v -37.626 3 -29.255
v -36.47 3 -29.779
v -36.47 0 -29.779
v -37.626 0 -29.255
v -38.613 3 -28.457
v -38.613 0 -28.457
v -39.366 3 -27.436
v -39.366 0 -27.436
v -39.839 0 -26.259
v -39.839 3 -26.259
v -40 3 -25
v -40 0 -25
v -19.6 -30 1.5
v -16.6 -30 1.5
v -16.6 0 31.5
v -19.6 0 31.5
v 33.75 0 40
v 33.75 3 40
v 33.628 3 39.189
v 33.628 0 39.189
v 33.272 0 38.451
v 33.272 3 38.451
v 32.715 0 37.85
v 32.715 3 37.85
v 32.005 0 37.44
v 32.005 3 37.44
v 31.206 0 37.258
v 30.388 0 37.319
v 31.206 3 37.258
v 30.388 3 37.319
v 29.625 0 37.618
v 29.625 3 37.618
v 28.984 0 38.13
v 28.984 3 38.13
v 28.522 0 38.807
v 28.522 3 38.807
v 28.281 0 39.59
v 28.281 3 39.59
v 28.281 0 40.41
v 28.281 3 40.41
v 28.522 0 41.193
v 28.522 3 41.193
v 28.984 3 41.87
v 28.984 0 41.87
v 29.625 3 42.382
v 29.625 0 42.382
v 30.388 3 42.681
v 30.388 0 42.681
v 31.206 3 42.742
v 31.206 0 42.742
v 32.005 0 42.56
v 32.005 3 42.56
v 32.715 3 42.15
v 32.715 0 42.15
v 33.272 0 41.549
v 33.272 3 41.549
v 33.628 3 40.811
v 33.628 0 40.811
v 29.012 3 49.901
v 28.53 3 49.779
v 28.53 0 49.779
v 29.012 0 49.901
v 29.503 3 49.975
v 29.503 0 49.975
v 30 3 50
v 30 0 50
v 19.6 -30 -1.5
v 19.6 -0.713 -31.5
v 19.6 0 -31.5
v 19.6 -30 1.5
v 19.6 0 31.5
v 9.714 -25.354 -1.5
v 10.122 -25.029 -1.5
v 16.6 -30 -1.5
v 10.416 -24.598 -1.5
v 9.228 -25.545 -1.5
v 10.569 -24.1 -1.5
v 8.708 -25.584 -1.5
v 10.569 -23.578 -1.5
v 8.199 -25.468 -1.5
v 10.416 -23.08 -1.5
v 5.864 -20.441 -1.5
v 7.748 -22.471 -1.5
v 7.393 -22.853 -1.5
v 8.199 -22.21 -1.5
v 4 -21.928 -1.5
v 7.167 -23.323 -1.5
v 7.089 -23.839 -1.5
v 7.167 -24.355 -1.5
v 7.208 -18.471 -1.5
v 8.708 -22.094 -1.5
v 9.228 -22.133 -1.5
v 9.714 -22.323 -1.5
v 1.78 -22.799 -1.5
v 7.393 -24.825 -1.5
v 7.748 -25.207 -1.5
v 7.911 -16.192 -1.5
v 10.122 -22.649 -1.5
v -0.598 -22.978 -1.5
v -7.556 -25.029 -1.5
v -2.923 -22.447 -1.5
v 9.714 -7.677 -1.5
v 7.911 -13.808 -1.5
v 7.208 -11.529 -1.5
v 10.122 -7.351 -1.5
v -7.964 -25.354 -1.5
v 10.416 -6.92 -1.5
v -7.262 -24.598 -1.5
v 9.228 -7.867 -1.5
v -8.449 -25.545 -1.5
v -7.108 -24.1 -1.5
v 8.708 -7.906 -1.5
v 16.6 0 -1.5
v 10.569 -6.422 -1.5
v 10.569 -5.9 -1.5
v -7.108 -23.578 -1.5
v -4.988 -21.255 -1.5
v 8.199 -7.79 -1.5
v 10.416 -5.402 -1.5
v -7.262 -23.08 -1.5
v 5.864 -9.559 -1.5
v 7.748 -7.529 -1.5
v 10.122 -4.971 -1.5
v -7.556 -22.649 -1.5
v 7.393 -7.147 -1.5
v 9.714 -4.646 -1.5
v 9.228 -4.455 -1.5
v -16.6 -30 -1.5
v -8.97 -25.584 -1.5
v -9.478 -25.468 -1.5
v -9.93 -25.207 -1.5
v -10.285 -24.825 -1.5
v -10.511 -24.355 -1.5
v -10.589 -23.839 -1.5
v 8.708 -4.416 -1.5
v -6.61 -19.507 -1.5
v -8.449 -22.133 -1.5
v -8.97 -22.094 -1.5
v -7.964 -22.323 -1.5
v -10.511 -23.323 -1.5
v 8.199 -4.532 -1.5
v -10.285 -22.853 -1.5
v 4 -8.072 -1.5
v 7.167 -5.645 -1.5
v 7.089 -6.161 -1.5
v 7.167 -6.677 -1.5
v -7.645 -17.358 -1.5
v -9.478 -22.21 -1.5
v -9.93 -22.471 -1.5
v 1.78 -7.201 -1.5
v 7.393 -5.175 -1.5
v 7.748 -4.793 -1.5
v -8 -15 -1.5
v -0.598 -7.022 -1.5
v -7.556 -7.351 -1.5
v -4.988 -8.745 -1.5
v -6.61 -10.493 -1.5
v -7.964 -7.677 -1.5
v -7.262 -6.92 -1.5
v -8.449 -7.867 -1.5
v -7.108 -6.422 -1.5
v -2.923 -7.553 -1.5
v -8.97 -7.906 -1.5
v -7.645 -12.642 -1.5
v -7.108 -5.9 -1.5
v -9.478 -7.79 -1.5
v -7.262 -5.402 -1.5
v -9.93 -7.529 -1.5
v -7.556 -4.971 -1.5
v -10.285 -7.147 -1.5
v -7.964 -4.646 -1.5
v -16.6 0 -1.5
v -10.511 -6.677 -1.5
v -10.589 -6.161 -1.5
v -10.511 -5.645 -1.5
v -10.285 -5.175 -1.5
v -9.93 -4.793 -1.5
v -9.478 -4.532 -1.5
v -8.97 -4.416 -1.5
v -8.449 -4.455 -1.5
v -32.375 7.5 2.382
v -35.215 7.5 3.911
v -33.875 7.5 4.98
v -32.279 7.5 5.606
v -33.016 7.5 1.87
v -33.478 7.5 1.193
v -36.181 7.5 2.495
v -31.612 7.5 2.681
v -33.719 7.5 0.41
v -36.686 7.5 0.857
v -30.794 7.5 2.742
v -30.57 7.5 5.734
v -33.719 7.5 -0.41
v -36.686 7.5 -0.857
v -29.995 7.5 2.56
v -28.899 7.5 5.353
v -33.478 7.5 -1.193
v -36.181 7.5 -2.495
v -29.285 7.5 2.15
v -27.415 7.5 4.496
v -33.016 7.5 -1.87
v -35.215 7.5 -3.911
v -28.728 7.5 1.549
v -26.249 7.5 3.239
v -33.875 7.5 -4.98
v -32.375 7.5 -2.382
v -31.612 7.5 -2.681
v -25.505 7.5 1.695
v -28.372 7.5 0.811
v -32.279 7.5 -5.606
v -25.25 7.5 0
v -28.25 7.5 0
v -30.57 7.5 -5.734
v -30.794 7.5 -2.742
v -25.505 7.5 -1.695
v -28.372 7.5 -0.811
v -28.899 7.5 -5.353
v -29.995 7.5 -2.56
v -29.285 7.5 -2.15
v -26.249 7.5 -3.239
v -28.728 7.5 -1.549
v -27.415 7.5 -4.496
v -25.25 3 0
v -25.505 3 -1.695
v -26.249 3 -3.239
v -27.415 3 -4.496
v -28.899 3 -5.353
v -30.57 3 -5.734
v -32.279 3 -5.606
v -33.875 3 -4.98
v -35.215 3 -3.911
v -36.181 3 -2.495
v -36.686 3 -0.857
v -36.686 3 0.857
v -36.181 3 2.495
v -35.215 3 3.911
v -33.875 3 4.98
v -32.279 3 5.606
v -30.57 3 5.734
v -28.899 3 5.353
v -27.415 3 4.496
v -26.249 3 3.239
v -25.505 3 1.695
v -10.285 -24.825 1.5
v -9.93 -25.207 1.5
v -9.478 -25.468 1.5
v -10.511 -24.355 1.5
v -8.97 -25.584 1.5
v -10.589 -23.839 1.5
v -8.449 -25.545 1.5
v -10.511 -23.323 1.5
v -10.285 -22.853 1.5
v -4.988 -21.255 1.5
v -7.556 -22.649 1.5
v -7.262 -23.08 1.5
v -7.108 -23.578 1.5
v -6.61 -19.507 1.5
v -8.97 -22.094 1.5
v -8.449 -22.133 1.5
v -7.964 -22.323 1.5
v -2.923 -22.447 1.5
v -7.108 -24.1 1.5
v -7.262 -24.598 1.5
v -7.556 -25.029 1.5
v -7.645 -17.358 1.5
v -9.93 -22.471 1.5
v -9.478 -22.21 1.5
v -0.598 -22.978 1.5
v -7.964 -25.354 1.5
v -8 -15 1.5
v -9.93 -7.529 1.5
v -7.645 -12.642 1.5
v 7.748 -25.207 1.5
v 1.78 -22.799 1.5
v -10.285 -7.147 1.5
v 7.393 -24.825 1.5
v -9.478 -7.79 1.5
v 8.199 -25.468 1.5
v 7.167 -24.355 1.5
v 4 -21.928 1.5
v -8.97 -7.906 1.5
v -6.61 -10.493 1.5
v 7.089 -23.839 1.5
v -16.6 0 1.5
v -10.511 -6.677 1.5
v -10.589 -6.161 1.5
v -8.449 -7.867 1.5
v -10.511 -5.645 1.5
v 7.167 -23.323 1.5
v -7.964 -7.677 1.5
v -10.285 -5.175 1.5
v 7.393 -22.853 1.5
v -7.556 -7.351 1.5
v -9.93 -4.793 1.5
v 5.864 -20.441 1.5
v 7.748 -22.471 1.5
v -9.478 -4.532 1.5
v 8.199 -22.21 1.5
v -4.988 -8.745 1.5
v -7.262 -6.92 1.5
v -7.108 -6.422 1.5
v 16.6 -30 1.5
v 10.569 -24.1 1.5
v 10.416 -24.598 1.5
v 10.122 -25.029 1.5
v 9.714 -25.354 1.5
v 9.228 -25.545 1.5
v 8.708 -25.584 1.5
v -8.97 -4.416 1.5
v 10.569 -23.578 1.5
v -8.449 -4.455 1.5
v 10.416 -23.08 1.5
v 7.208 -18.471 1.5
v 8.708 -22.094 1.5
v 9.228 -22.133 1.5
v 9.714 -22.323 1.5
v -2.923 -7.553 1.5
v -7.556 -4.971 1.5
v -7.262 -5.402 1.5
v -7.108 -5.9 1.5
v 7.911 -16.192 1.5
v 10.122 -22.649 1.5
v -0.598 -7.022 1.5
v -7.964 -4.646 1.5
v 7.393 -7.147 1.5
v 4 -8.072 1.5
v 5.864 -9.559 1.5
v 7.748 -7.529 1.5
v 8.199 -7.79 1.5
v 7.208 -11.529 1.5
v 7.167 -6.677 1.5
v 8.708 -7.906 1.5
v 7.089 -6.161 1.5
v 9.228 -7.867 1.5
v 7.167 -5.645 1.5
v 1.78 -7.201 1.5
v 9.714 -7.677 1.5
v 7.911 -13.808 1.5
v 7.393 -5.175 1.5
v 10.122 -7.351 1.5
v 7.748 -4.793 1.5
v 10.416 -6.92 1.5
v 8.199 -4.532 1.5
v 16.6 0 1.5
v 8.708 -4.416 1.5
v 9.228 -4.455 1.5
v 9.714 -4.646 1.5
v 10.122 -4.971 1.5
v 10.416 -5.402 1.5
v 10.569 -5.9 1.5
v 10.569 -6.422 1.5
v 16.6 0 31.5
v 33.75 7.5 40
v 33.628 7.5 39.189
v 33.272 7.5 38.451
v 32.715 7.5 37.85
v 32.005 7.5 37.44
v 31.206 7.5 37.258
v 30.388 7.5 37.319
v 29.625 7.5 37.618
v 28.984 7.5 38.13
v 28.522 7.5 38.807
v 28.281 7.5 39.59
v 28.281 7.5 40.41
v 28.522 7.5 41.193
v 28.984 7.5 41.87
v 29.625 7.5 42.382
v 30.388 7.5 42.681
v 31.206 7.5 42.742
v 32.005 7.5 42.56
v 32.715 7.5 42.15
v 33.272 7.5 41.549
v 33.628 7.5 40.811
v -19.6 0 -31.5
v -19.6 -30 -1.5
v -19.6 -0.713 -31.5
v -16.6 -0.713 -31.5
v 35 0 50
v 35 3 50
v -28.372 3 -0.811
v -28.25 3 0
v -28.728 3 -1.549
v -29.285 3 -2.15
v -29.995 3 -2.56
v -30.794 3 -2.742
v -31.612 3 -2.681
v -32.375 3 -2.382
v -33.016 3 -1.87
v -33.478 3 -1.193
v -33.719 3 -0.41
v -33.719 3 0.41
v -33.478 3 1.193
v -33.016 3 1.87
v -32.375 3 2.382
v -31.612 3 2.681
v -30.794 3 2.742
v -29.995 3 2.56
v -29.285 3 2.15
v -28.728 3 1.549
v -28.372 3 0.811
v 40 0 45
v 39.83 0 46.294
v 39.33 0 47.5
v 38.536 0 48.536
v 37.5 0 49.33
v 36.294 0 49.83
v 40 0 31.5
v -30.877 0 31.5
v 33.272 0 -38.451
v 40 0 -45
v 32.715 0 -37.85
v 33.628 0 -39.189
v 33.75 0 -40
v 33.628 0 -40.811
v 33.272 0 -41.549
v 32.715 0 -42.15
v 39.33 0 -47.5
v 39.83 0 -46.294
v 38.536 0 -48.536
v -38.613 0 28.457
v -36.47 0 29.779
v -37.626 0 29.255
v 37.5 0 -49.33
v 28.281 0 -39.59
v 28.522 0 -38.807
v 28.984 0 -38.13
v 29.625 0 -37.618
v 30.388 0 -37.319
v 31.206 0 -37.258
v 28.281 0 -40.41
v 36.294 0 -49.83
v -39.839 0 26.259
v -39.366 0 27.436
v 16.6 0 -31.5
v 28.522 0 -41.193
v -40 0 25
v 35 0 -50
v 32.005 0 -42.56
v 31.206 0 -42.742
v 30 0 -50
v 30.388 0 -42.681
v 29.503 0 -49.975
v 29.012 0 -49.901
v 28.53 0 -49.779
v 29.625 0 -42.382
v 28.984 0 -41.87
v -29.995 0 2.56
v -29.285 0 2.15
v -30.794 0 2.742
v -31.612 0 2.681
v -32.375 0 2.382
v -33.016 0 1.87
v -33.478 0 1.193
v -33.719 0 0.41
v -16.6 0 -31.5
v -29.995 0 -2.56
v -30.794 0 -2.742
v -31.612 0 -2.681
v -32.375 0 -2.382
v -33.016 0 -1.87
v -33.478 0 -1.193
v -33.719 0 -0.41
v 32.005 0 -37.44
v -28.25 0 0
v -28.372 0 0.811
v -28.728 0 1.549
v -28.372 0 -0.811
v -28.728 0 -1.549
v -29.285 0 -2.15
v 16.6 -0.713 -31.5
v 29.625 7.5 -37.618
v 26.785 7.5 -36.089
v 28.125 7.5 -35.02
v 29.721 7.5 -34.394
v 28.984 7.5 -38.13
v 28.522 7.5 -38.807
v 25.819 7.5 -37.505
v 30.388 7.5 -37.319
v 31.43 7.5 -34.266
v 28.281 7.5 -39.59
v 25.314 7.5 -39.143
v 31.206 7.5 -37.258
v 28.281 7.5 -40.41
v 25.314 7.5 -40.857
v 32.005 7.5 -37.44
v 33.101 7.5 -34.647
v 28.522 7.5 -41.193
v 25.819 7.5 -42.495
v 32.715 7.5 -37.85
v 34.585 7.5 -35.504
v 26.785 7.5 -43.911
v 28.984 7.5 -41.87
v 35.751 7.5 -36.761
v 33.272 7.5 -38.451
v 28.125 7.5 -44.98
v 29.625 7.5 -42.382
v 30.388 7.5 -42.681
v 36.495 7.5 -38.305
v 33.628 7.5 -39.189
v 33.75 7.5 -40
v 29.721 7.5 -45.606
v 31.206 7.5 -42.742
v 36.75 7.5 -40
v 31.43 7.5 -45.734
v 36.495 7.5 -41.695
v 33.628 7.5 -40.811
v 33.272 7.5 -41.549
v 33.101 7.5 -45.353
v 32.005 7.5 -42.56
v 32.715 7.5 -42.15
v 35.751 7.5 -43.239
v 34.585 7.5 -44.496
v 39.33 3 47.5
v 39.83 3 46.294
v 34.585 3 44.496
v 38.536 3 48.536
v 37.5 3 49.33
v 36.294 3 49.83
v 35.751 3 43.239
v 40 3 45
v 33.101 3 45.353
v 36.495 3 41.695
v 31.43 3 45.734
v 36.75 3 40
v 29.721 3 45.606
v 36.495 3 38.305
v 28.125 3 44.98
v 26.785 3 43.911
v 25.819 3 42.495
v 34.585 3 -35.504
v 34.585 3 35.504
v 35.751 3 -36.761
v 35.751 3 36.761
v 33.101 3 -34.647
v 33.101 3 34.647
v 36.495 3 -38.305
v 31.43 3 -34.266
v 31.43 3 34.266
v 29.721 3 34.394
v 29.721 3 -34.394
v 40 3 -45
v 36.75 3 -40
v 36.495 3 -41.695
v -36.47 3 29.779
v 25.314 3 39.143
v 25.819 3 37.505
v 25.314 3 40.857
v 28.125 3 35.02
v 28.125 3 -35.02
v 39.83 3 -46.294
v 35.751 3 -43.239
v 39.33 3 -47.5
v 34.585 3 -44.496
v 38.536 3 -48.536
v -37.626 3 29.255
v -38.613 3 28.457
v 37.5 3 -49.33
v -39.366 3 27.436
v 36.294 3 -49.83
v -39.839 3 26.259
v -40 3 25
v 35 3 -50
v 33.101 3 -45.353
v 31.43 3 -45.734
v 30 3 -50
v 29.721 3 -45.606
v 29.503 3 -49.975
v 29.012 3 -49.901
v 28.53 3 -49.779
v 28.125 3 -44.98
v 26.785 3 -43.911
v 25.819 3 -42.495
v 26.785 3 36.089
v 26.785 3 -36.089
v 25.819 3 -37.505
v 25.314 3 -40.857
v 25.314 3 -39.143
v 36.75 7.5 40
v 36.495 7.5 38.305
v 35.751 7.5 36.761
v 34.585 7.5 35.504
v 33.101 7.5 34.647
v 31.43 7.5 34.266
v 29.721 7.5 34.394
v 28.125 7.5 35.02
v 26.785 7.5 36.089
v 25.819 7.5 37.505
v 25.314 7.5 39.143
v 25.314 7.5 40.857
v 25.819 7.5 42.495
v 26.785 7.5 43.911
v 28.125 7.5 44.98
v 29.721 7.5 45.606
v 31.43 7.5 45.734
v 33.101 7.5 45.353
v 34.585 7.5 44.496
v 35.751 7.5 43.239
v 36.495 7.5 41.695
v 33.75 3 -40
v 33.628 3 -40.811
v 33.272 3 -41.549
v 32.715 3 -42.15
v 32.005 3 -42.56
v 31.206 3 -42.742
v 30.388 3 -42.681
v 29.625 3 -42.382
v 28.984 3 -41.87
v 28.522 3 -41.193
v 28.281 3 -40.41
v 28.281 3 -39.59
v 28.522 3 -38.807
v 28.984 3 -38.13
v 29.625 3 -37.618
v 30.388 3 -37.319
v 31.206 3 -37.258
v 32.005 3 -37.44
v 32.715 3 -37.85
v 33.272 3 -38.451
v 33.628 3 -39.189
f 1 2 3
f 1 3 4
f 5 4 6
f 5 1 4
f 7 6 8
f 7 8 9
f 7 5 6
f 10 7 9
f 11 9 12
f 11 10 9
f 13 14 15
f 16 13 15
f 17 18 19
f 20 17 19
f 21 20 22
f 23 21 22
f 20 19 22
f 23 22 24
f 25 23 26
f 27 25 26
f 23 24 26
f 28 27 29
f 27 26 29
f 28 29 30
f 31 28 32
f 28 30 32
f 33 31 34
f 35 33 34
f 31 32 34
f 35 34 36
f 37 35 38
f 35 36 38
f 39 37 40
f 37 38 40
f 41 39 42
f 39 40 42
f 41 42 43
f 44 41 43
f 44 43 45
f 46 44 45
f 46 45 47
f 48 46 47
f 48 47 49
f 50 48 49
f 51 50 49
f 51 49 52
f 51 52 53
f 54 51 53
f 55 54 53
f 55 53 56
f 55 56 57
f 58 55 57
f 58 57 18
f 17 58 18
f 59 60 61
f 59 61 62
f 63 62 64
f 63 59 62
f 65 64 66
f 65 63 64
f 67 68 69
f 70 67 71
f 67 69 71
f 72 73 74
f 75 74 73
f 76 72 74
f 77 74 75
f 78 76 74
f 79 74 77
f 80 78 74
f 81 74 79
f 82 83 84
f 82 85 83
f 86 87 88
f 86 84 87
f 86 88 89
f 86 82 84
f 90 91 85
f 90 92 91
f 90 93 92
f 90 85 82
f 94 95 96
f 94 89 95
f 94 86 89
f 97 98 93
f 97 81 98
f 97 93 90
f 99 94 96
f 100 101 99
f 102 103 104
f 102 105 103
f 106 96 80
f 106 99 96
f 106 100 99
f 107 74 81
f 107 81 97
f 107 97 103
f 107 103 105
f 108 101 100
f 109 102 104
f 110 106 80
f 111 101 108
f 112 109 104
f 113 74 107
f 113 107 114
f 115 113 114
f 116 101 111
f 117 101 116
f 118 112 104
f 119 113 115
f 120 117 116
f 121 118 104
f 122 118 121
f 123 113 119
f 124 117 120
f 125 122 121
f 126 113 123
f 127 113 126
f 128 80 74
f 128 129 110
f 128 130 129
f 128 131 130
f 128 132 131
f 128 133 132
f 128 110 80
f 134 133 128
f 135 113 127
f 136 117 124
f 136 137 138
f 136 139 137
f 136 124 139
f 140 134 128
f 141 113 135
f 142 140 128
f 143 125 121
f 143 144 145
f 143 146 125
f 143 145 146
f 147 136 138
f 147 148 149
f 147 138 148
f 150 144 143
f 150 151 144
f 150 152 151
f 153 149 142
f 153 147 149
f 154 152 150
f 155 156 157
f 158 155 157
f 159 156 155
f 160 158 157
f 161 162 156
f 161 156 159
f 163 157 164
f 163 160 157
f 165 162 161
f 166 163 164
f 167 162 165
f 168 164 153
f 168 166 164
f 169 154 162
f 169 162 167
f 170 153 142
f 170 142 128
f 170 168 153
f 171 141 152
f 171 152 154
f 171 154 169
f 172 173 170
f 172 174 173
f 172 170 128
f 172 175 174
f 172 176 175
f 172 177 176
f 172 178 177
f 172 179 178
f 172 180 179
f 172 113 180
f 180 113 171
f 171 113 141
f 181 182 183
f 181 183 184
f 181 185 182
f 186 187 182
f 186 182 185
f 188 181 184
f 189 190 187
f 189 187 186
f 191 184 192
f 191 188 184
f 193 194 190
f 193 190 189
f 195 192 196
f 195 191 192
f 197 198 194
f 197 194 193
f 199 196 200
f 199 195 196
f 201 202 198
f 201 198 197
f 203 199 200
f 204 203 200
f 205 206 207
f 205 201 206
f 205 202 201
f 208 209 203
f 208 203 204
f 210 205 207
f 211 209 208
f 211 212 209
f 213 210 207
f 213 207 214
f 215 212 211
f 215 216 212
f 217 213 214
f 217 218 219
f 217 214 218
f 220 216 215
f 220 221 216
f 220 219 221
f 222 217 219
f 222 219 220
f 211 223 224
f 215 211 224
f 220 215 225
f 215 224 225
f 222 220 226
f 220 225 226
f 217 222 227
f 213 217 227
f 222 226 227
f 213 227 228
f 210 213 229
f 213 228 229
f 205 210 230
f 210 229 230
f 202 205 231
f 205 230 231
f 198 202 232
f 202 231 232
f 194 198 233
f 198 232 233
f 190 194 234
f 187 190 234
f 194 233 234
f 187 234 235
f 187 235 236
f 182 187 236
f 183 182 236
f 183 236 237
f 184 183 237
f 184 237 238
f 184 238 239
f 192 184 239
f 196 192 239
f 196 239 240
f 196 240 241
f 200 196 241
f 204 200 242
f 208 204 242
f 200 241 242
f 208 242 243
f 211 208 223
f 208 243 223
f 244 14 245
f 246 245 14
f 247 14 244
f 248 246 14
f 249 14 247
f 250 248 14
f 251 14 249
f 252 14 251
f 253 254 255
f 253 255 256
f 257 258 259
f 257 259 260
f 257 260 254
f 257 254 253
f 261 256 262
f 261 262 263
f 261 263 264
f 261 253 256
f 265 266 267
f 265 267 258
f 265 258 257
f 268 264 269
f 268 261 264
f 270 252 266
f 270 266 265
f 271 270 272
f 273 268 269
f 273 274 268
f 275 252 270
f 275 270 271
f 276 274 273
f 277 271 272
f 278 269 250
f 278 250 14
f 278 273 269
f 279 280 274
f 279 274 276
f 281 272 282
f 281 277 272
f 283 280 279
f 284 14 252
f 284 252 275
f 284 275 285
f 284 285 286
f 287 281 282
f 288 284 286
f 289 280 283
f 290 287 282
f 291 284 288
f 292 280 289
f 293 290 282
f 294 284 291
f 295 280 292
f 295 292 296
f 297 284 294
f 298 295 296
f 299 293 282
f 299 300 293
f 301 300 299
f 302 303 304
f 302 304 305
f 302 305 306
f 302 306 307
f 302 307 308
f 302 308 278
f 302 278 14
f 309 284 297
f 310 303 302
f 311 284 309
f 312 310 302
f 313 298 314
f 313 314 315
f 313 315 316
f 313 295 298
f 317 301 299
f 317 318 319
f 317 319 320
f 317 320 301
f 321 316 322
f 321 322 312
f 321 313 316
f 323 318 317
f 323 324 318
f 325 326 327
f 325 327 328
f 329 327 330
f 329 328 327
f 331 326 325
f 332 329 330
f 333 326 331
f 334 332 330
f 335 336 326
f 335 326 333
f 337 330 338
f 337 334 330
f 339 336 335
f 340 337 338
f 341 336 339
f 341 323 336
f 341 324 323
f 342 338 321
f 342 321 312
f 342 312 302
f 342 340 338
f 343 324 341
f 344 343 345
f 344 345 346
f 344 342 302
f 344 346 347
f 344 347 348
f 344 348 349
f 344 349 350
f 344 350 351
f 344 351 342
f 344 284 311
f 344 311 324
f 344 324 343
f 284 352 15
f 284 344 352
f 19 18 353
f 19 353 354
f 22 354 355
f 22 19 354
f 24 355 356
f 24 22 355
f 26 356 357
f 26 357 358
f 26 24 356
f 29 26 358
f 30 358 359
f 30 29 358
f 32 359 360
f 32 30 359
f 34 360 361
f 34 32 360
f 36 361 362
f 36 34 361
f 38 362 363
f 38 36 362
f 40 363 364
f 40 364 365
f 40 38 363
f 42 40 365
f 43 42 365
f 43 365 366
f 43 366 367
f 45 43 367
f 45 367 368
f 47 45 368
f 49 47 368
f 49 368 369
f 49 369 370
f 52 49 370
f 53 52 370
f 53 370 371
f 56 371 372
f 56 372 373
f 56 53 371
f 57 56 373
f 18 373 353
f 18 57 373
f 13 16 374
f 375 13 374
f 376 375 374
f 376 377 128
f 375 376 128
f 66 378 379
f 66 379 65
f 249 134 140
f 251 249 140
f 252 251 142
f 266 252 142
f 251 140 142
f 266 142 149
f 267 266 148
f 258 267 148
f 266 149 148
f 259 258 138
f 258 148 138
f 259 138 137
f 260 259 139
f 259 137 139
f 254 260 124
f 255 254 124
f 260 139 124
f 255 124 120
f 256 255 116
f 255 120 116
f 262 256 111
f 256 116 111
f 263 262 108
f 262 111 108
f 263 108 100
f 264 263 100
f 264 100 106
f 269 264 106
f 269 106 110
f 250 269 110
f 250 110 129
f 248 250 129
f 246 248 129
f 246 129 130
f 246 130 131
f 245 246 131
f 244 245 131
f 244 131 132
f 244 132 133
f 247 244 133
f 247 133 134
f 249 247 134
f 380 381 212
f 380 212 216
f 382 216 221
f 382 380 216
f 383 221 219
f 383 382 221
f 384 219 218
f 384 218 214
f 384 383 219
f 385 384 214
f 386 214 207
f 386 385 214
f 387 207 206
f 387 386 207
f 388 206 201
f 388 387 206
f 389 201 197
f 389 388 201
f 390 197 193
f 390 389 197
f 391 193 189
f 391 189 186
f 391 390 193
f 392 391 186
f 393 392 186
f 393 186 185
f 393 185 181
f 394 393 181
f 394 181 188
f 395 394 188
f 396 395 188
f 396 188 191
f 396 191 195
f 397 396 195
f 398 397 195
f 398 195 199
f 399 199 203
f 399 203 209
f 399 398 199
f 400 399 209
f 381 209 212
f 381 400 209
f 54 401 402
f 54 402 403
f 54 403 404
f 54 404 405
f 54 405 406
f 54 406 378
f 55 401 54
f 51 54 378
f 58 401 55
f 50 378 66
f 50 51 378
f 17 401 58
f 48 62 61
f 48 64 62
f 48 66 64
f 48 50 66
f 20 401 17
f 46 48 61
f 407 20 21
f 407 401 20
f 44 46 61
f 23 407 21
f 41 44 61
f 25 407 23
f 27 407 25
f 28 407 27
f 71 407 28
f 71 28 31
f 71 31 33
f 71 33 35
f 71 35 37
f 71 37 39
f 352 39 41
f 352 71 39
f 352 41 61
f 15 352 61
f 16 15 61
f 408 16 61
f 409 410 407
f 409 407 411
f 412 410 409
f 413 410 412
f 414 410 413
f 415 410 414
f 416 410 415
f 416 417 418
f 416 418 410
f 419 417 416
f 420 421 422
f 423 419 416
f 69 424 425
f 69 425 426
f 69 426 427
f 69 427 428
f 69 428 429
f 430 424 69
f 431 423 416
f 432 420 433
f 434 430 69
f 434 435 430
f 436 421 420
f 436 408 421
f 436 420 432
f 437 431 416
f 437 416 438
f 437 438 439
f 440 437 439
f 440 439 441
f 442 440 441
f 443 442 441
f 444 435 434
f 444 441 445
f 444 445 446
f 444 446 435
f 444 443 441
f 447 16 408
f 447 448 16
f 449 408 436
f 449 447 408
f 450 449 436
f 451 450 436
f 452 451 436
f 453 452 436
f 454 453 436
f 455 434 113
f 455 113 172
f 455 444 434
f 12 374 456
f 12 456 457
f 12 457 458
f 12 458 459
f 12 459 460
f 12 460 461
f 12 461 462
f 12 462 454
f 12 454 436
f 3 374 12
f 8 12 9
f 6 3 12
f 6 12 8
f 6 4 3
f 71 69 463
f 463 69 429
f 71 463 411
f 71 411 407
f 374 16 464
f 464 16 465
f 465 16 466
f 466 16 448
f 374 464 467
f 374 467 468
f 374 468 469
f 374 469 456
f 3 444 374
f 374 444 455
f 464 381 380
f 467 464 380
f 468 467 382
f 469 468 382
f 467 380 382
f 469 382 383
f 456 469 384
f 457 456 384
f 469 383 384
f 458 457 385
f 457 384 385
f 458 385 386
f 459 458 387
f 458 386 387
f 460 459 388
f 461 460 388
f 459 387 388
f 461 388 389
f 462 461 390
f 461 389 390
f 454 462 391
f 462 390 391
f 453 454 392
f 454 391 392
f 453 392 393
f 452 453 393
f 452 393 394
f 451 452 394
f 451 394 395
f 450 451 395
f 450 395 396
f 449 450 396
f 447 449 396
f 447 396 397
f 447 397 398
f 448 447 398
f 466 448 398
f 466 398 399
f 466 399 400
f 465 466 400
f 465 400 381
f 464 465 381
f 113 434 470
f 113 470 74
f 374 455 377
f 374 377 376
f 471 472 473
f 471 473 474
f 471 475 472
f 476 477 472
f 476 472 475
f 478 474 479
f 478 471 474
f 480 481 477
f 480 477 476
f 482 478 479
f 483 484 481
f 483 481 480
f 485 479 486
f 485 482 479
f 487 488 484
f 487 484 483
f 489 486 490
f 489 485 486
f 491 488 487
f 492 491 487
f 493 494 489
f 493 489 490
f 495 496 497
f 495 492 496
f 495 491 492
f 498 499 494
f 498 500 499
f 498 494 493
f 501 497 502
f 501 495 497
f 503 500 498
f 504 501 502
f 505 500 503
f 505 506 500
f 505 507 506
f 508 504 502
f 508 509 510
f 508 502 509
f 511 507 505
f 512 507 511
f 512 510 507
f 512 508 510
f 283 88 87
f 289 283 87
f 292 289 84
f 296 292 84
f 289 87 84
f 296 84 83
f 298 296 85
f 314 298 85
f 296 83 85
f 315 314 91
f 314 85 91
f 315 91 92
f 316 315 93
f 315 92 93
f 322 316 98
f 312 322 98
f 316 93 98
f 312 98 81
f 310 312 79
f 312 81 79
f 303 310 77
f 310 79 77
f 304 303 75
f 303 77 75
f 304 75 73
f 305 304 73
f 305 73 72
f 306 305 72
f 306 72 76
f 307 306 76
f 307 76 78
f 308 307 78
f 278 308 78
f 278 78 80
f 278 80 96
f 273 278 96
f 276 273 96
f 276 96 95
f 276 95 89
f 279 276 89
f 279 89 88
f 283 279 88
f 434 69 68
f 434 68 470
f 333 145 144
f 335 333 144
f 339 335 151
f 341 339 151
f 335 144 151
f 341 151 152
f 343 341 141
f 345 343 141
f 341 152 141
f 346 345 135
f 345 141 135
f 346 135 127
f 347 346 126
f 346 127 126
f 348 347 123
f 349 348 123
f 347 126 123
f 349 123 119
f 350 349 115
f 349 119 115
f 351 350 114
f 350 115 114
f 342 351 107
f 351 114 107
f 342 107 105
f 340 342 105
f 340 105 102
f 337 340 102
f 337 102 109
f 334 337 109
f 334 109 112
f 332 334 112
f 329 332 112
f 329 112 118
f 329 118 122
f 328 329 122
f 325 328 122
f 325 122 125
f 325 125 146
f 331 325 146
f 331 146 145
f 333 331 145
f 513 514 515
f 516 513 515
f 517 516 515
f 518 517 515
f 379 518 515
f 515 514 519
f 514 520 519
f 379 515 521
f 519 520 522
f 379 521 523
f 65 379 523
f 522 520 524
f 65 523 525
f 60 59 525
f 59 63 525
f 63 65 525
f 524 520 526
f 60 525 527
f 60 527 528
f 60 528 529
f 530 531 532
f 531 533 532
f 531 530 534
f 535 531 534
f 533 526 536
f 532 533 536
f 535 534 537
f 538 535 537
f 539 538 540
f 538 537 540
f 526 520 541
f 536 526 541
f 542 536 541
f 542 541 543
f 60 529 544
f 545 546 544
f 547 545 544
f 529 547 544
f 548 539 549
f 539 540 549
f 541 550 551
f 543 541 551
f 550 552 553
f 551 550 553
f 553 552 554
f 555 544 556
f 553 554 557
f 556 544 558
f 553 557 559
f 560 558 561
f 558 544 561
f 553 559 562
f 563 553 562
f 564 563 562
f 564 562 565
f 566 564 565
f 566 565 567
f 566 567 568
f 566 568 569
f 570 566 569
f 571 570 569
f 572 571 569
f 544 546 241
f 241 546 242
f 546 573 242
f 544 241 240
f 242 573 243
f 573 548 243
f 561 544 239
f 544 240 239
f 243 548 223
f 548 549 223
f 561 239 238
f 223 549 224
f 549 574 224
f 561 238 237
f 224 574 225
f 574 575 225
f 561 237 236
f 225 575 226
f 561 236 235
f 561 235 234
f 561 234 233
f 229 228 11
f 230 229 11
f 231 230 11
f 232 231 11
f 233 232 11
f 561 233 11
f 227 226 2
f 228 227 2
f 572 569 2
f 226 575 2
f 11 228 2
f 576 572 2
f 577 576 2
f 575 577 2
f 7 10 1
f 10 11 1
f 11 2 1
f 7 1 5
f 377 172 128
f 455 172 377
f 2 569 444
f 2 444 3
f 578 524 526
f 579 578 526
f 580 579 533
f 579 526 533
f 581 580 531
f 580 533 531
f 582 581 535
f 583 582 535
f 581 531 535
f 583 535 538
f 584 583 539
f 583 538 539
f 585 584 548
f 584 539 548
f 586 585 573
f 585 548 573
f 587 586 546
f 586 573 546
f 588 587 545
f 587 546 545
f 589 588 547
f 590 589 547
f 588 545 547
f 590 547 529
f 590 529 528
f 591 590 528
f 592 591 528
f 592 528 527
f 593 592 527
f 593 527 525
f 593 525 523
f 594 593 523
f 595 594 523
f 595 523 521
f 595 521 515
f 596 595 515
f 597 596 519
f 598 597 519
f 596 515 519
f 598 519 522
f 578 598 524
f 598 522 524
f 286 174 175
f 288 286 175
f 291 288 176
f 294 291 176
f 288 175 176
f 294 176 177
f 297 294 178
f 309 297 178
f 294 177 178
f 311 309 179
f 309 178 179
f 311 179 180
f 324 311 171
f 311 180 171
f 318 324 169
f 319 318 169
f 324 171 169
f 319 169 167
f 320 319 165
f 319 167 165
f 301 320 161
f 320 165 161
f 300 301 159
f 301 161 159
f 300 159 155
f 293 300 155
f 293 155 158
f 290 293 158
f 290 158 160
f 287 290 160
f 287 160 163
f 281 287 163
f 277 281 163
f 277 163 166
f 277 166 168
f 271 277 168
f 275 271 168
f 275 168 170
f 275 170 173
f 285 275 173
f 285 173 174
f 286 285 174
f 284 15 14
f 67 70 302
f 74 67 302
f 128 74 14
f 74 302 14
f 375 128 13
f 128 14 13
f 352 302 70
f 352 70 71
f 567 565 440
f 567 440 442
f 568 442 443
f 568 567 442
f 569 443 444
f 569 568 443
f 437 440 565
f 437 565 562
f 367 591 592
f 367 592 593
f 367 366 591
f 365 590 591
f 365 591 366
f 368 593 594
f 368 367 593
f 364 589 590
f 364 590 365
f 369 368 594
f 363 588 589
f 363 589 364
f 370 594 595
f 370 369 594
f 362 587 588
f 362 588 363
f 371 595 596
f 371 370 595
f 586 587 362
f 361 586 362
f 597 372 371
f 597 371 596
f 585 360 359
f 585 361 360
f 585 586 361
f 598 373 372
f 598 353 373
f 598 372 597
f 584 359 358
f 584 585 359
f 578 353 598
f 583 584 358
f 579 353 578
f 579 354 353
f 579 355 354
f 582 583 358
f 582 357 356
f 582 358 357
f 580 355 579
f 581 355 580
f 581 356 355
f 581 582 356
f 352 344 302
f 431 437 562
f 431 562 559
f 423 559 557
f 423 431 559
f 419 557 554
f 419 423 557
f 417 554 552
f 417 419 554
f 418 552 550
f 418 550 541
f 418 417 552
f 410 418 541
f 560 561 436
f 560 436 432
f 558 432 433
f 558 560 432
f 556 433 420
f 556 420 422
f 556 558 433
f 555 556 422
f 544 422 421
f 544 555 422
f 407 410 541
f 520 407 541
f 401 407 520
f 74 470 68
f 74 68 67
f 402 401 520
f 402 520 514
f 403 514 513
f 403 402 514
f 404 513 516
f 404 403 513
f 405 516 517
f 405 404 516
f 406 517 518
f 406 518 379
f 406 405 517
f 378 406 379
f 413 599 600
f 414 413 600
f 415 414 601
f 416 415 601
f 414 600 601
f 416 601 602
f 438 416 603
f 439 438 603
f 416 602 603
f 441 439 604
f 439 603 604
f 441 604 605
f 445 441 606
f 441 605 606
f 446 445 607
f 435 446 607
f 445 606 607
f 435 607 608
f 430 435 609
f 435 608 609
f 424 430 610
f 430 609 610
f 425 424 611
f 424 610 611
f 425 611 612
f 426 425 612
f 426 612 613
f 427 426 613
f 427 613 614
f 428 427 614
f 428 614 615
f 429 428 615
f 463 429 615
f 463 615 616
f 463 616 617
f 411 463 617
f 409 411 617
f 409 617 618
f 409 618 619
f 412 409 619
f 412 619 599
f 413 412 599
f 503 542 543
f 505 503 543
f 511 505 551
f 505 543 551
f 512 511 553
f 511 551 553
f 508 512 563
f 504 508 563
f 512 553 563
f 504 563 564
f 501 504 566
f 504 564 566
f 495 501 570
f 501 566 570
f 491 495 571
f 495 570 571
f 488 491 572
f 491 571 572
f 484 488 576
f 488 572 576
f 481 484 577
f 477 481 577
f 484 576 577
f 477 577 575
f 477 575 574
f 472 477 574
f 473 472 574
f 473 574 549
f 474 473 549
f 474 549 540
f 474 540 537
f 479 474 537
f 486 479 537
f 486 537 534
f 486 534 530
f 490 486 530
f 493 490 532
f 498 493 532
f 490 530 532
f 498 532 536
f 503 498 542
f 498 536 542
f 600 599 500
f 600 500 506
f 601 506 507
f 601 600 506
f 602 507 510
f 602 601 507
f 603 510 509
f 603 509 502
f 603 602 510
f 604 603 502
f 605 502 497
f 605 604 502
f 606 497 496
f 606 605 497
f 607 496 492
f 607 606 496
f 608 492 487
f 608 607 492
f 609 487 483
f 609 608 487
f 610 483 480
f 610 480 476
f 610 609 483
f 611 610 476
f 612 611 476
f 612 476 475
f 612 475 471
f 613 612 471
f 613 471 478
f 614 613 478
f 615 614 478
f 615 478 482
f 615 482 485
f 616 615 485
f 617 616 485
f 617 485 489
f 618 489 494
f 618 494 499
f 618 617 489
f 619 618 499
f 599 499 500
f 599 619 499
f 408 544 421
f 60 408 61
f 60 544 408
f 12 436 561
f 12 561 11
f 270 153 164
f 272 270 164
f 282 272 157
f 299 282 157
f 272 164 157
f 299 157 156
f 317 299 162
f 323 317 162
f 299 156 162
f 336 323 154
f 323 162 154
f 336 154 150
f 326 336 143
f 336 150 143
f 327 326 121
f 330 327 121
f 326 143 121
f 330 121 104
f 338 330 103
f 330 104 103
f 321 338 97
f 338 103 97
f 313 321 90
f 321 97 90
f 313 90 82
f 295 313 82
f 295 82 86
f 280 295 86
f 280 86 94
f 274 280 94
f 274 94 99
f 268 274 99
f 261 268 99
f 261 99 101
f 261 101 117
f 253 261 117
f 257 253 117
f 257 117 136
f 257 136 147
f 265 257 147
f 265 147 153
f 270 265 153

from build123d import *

# Parameters (mm, degrees)
BOSS_EXTRUDE1_DEPTH     = 3
SKETCH2_R               = 2.75
CUT_EXTRUDE1_DEPTH      = 4
SKETCH3_2_R             = 5.75
SKETCH3_2_R_2           = 2.75
BOSS_EXTRUDE3_DEPTH     = 4.5
CUT_EXTRUDE2_DEPTH      = 4.5
BOSS_EXTRUDE4_DEPTH     = 30
CUT_EXTRUDE3_DEPTH      = 57.6
CUT_EXTRUDE3_DEPTH_BACK = 24.4
SKETCH9_R               = 8
SKETCH9_R_2             = 1.75
CUT_EXTRUDE4_DEPTH      = 49.5
CUT_EXTRUDE4_DEPTH_BACK = 52.5
SKETCH3_R               = 5.75
SKETCH3_R_2             = 2.75
BOSS_EXTRUDE2_DEPTH     = 4.5


with BuildPart() as part:
    # Sketch1 → Boss-Extrude1 (new body)
    with BuildSketch(Plane(origin=(0, 0, 0), x_dir=(1, 0, 0), z_dir=(0, 1, 0))):
        with BuildLine():
            Line((-35, 50), (35, 50))
            ThreePointArc((35, 50), (38.535533906, 48.535533906), (40, 45))
            Line((40, 45), (40, -45))
            ThreePointArc((40, -45), (38.535533906, -48.535533906), (35, -50))
            Line((35, -50), (-35, -50))
            ThreePointArc((-35, -50), (-38.535533906, -48.535533906), (-40, -45))
            Line((-40, -45), (-40, 45))
            ThreePointArc((-40, 45), (-38.535533906, 48.535533906), (-35, 50))
        make_face()
    extrude(amount=BOSS_EXTRUDE1_DEPTH)

    # Sketch2 → Cut-Extrude1 (cut, through all)
    with BuildSketch(Plane(origin=(0, 3, 0), x_dir=(1, 0, 0), z_dir=(0, 1, 0))):
        with Locations((-31, 0)):
            Circle(SKETCH2_R)
        with Locations((31, 40)):
            Circle(SKETCH2_R)
        with Locations((31, -40)):
            Circle(SKETCH2_R)
    extrude(amount=-CUT_EXTRUDE1_DEPTH, mode=Mode.SUBTRACT)

    # Sketch3<2> → Boss-Extrude3 (add)
    with BuildSketch(Plane(origin=(0, 3, 0), x_dir=(1, 0, 0), z_dir=(0, 1, 0))):
        with Locations((-31, 0)):
            Circle(SKETCH3_2_R)
        with Locations((-31, 0)):
            Circle(SKETCH3_2_R_2, mode=Mode.SUBTRACT)
        with Locations((31, 40)):
            Circle(SKETCH3_2_R)
        with Locations((31, 40)):
            Circle(SKETCH3_2_R_2, mode=Mode.SUBTRACT)
        with Locations((31, -40)):
            Circle(SKETCH3_2_R)
        with Locations((31, -40)):
            Circle(SKETCH3_2_R_2, mode=Mode.SUBTRACT)
    extrude(amount=BOSS_EXTRUDE3_DEPTH)

    # Sketch6 → Cut-Extrude2 (cut)
    with BuildSketch(Plane(origin=(0, 3, 0), x_dir=(1, 0, 0), z_dir=(0, 1, 0))):
        with BuildLine():
            Line((-36.470429244, -29.778895044), (28.529570756, -49.778895044))
            ThreePointArc((28.529570756, -49.778895044), (29.25652008, -49.944414789), (30, -50))
            Line((30, -50), (-40, -50))
            Line((-40, -50), (-40, -25))
            ThreePointArc((-40, -25), (-39.021948919, -27.970509534), (-36.470429244, -29.778895044))
        make_face()
        with BuildLine():
            Line((-40, 50), (30, 50))
            ThreePointArc((30, 50), (29.25652008, 49.944414789), (28.529570756, 49.778895044))
            Line((28.529570756, 49.778895044), (-36.470429244, 29.778895044))
            ThreePointArc((-36.470429244, 29.778895044), (-39.021948919, 27.970509534), (-40, 25))
            Line((-40, 25), (-40, 50))
        make_face()
    extrude(amount=-CUT_EXTRUDE2_DEPTH, mode=Mode.SUBTRACT)

    # Sketch7 → Boss-Extrude4 (add)
    with BuildSketch(Plane.XZ):
        Polygon((19.6, 6.770211843), (19.6, -6.770211843), (19.6, -31.5), (16.6, -31.5), (16.6, -1.5), (-16.6, -1.5), (-16.6, -31.5), (-19.6, -31.5), (-19.6, -6.770211843), (-19.6, 6.770211843), (-19.6, 31.5), (-16.6, 31.5), (-16.6, 1.5), (16.6, 1.5), (16.6, 31.5), (19.6, 31.5), align=None)
    extrude(amount=BOSS_EXTRUDE4_DEPTH)

    # Sketch8 → Cut-Extrude3 (cut, two sides)
    with BuildSketch(Plane.ZY.offset(-16.6)) as cut_extrude3_sk:
        Polygon((1.5, -30), (31.5, 0), (31.5, -30), align=None)
        Polygon((-1.5, -30), (-31.5, -30), (-31.5, -0.712729134), align=None)
    extrude(amount=CUT_EXTRUDE3_DEPTH, mode=Mode.SUBTRACT)
    extrude(cut_extrude3_sk.sketch, amount=-CUT_EXTRUDE3_DEPTH_BACK, mode=Mode.SUBTRACT)

    # Sketch9 → Cut-Extrude4 (cut, two sides)
    with BuildSketch(Plane(origin=(0, 0, -1.5), x_dir=(-1, 0, 0), z_dir=(0, 0, -1))) as cut_extrude4_sk:
        with Locations((0, -15)):
            Circle(SKETCH9_R)
        with Locations((-8.838834765, -23.838834765)):
            Circle(SKETCH9_R_2)
        with Locations((-8.838834765, -6.161165235)):
            Circle(SKETCH9_R_2)
        with Locations((8.838834765, -23.838834765)):
            Circle(SKETCH9_R_2)
        with Locations((8.838834765, -6.161165235)):
            Circle(SKETCH9_R_2)
    extrude(amount=CUT_EXTRUDE4_DEPTH, mode=Mode.SUBTRACT)
    extrude(cut_extrude4_sk.sketch, amount=-CUT_EXTRUDE4_DEPTH_BACK, mode=Mode.SUBTRACT)

    # Sketch3 → Boss-Extrude2 (add)
    with BuildSketch(Plane(origin=(0, 3, 0), x_dir=(1, 0, 0), z_dir=(0, 1, 0))):
        with Locations((-31, 0)):
            Circle(SKETCH3_R)
        with Locations((-31, 0)):
            Circle(SKETCH3_R_2, mode=Mode.SUBTRACT)
        with Locations((31, 40)):
            Circle(SKETCH3_R)
        with Locations((31, 40)):
            Circle(SKETCH3_R_2, mode=Mode.SUBTRACT)
        with Locations((31, -40)):
            Circle(SKETCH3_R)
        with Locations((31, -40)):
            Circle(SKETCH3_R_2, mode=Mode.SUBTRACT)
    extrude(amount=BOSS_EXTRUDE2_DEPTH)


solid = part.part
